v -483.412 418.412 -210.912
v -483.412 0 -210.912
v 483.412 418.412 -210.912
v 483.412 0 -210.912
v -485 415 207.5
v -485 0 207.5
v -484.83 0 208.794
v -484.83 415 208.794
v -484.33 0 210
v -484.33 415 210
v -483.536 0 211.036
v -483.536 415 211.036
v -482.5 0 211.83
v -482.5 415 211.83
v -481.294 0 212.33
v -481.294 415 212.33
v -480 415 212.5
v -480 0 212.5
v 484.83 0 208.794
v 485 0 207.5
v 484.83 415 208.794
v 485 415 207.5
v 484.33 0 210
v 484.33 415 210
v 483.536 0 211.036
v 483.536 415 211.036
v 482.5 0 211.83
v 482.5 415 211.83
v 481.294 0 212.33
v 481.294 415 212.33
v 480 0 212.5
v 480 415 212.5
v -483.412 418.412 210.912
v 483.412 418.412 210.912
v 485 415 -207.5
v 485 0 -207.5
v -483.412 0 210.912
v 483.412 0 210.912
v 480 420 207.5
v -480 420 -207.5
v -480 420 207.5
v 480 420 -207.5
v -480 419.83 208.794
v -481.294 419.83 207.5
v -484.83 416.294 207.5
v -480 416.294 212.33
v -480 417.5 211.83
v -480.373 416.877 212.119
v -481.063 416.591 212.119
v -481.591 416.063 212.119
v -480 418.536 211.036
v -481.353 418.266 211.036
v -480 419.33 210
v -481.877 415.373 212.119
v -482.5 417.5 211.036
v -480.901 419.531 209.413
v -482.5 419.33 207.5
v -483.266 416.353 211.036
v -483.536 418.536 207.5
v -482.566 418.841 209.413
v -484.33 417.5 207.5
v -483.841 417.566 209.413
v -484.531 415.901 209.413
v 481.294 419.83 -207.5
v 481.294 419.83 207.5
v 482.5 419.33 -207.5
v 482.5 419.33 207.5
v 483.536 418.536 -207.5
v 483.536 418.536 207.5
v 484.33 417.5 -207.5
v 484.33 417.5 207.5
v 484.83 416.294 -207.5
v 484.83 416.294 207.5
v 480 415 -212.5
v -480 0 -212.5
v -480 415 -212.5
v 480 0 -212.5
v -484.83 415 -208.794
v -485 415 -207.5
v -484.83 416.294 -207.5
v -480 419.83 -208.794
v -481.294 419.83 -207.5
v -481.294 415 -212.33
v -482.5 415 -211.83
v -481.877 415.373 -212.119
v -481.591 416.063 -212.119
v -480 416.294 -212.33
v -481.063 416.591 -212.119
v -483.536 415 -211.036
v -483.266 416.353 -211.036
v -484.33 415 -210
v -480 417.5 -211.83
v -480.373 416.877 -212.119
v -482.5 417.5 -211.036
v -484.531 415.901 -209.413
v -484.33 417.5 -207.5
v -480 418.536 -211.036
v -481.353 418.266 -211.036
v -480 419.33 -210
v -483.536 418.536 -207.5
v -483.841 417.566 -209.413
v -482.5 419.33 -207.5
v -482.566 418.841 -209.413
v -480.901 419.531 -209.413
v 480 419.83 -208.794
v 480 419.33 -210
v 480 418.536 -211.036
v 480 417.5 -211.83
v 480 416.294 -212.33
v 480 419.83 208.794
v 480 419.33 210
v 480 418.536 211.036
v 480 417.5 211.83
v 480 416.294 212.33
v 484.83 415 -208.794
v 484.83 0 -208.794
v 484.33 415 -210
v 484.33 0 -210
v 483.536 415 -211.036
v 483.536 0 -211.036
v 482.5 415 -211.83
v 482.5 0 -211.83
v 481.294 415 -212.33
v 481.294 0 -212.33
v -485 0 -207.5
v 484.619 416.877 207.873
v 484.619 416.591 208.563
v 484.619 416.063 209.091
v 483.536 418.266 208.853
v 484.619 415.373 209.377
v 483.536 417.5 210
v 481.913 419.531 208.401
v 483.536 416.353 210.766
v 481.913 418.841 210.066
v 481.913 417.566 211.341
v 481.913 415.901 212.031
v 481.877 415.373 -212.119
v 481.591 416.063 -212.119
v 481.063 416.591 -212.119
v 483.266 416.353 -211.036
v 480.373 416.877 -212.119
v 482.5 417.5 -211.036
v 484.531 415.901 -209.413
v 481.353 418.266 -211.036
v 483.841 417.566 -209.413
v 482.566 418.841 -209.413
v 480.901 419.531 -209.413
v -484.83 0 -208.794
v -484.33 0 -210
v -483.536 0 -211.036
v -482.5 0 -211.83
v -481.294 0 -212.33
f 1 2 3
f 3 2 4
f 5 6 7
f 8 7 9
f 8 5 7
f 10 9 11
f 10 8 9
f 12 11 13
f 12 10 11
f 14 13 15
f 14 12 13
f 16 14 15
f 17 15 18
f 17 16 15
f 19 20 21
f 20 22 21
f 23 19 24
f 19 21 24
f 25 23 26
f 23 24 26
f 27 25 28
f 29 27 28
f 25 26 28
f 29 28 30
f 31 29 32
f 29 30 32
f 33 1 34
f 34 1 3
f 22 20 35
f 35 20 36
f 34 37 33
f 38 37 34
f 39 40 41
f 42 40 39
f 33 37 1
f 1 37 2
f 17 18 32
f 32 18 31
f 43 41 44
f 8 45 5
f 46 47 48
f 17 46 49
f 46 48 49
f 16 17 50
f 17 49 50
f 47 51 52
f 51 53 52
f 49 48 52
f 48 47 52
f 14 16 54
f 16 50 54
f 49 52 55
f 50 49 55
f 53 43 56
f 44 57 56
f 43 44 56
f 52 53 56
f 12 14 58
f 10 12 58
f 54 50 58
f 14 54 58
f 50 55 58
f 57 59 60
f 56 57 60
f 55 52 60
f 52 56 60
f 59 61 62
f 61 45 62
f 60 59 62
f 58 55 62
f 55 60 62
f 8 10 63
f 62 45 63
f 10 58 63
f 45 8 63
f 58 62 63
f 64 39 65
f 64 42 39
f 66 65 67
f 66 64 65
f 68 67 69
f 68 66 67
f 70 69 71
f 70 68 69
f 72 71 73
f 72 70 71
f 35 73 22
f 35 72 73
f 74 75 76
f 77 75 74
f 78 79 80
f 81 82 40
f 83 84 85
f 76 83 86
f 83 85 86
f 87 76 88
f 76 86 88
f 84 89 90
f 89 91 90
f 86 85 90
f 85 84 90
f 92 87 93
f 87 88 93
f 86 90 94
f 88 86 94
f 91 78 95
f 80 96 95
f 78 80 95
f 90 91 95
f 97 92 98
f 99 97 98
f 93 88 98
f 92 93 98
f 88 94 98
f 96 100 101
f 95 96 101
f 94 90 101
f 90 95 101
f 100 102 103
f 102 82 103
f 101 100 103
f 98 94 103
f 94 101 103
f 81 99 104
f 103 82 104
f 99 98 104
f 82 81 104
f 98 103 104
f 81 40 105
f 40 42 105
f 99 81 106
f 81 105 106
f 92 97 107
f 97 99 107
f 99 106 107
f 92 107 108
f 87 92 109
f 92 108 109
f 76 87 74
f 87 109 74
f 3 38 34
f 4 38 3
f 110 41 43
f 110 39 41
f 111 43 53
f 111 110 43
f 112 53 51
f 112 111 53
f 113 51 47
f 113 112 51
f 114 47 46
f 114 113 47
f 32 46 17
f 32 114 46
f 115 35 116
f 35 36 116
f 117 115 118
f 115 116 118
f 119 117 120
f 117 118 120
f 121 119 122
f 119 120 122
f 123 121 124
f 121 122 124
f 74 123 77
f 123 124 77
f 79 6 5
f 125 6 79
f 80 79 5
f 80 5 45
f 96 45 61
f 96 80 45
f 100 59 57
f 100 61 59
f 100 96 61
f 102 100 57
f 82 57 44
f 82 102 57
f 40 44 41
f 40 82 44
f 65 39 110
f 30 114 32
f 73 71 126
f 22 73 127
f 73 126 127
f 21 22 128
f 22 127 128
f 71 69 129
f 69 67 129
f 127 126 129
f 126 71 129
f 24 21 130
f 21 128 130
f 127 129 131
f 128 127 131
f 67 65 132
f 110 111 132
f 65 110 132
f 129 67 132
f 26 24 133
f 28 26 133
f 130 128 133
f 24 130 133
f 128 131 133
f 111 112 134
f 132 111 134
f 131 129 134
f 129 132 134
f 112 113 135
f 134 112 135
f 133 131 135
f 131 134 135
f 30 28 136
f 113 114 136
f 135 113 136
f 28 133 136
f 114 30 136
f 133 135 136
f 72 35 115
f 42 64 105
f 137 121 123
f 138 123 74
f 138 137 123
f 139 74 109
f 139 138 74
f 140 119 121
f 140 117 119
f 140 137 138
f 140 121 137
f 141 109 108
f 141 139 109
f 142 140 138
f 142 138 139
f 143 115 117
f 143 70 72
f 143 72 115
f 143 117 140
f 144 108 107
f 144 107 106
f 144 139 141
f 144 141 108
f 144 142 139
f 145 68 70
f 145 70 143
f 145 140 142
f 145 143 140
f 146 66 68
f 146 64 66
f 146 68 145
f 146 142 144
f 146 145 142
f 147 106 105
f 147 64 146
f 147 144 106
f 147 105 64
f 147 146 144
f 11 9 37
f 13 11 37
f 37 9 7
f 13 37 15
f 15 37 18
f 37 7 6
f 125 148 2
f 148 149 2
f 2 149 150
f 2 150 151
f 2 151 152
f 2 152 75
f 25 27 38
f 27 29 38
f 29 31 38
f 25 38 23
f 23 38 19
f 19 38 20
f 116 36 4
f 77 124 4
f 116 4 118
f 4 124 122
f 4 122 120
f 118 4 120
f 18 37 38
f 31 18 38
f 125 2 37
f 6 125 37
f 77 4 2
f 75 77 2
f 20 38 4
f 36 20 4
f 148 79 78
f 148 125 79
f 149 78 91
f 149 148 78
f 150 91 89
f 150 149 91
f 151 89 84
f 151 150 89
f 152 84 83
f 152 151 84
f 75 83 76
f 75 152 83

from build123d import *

# Parameters (mm, degrees)
SKETCH2_W           = 970
SKETCH2_H           = 425
SKETCH2_W_2         = 966.825
SKETCH2_H_2         = 421.825
BOSS_EXTRUDE1_DEPTH = 420
BOSS_EXTRUDE2_START = 420
SKETCH3_W           = 970
SKETCH3_H           = 425
BOSS_EXTRUDE2_DEPTH = 1.5875
FILLET2_R           = 5


with BuildPart() as part:
    # Sketch2 → Boss-Extrude1 (new body)
    with BuildSketch(Plane(origin=(0, 0, 0), x_dir=(1, 0, 0), z_dir=(0, 1, 0))):
        Rectangle(SKETCH2_W, SKETCH2_H)
        Rectangle(SKETCH2_W_2, SKETCH2_H_2, mode=Mode.SUBTRACT)
    extrude(amount=BOSS_EXTRUDE1_DEPTH)

    # Sketch3 → Boss-Extrude2 (add)
    with BuildSketch(Plane(origin=(0, 0, 0), x_dir=(1, 0, 0), z_dir=(0, 1, 0)).offset(BOSS_EXTRUDE2_START)):
        Rectangle(SKETCH3_W, SKETCH3_H)
    extrude(amount=-BOSS_EXTRUDE2_DEPTH)

    # Fillet2
    fillet2_edges = [part.edges().sort_by_distance(p)[0] for p in [
        (-485, 420, 0),
        (0, 420, 212.5),
        (485, 420, 0),
        (485, 210, 212.5),
        (-485, 210, 212.5),
        (-485, 210, -212.5),
        (485, 210, -212.5),
        (0, 420, -212.5),
    ]]
    fillet(fillet2_edges, radius=FILLET2_R)


solid = part.part
